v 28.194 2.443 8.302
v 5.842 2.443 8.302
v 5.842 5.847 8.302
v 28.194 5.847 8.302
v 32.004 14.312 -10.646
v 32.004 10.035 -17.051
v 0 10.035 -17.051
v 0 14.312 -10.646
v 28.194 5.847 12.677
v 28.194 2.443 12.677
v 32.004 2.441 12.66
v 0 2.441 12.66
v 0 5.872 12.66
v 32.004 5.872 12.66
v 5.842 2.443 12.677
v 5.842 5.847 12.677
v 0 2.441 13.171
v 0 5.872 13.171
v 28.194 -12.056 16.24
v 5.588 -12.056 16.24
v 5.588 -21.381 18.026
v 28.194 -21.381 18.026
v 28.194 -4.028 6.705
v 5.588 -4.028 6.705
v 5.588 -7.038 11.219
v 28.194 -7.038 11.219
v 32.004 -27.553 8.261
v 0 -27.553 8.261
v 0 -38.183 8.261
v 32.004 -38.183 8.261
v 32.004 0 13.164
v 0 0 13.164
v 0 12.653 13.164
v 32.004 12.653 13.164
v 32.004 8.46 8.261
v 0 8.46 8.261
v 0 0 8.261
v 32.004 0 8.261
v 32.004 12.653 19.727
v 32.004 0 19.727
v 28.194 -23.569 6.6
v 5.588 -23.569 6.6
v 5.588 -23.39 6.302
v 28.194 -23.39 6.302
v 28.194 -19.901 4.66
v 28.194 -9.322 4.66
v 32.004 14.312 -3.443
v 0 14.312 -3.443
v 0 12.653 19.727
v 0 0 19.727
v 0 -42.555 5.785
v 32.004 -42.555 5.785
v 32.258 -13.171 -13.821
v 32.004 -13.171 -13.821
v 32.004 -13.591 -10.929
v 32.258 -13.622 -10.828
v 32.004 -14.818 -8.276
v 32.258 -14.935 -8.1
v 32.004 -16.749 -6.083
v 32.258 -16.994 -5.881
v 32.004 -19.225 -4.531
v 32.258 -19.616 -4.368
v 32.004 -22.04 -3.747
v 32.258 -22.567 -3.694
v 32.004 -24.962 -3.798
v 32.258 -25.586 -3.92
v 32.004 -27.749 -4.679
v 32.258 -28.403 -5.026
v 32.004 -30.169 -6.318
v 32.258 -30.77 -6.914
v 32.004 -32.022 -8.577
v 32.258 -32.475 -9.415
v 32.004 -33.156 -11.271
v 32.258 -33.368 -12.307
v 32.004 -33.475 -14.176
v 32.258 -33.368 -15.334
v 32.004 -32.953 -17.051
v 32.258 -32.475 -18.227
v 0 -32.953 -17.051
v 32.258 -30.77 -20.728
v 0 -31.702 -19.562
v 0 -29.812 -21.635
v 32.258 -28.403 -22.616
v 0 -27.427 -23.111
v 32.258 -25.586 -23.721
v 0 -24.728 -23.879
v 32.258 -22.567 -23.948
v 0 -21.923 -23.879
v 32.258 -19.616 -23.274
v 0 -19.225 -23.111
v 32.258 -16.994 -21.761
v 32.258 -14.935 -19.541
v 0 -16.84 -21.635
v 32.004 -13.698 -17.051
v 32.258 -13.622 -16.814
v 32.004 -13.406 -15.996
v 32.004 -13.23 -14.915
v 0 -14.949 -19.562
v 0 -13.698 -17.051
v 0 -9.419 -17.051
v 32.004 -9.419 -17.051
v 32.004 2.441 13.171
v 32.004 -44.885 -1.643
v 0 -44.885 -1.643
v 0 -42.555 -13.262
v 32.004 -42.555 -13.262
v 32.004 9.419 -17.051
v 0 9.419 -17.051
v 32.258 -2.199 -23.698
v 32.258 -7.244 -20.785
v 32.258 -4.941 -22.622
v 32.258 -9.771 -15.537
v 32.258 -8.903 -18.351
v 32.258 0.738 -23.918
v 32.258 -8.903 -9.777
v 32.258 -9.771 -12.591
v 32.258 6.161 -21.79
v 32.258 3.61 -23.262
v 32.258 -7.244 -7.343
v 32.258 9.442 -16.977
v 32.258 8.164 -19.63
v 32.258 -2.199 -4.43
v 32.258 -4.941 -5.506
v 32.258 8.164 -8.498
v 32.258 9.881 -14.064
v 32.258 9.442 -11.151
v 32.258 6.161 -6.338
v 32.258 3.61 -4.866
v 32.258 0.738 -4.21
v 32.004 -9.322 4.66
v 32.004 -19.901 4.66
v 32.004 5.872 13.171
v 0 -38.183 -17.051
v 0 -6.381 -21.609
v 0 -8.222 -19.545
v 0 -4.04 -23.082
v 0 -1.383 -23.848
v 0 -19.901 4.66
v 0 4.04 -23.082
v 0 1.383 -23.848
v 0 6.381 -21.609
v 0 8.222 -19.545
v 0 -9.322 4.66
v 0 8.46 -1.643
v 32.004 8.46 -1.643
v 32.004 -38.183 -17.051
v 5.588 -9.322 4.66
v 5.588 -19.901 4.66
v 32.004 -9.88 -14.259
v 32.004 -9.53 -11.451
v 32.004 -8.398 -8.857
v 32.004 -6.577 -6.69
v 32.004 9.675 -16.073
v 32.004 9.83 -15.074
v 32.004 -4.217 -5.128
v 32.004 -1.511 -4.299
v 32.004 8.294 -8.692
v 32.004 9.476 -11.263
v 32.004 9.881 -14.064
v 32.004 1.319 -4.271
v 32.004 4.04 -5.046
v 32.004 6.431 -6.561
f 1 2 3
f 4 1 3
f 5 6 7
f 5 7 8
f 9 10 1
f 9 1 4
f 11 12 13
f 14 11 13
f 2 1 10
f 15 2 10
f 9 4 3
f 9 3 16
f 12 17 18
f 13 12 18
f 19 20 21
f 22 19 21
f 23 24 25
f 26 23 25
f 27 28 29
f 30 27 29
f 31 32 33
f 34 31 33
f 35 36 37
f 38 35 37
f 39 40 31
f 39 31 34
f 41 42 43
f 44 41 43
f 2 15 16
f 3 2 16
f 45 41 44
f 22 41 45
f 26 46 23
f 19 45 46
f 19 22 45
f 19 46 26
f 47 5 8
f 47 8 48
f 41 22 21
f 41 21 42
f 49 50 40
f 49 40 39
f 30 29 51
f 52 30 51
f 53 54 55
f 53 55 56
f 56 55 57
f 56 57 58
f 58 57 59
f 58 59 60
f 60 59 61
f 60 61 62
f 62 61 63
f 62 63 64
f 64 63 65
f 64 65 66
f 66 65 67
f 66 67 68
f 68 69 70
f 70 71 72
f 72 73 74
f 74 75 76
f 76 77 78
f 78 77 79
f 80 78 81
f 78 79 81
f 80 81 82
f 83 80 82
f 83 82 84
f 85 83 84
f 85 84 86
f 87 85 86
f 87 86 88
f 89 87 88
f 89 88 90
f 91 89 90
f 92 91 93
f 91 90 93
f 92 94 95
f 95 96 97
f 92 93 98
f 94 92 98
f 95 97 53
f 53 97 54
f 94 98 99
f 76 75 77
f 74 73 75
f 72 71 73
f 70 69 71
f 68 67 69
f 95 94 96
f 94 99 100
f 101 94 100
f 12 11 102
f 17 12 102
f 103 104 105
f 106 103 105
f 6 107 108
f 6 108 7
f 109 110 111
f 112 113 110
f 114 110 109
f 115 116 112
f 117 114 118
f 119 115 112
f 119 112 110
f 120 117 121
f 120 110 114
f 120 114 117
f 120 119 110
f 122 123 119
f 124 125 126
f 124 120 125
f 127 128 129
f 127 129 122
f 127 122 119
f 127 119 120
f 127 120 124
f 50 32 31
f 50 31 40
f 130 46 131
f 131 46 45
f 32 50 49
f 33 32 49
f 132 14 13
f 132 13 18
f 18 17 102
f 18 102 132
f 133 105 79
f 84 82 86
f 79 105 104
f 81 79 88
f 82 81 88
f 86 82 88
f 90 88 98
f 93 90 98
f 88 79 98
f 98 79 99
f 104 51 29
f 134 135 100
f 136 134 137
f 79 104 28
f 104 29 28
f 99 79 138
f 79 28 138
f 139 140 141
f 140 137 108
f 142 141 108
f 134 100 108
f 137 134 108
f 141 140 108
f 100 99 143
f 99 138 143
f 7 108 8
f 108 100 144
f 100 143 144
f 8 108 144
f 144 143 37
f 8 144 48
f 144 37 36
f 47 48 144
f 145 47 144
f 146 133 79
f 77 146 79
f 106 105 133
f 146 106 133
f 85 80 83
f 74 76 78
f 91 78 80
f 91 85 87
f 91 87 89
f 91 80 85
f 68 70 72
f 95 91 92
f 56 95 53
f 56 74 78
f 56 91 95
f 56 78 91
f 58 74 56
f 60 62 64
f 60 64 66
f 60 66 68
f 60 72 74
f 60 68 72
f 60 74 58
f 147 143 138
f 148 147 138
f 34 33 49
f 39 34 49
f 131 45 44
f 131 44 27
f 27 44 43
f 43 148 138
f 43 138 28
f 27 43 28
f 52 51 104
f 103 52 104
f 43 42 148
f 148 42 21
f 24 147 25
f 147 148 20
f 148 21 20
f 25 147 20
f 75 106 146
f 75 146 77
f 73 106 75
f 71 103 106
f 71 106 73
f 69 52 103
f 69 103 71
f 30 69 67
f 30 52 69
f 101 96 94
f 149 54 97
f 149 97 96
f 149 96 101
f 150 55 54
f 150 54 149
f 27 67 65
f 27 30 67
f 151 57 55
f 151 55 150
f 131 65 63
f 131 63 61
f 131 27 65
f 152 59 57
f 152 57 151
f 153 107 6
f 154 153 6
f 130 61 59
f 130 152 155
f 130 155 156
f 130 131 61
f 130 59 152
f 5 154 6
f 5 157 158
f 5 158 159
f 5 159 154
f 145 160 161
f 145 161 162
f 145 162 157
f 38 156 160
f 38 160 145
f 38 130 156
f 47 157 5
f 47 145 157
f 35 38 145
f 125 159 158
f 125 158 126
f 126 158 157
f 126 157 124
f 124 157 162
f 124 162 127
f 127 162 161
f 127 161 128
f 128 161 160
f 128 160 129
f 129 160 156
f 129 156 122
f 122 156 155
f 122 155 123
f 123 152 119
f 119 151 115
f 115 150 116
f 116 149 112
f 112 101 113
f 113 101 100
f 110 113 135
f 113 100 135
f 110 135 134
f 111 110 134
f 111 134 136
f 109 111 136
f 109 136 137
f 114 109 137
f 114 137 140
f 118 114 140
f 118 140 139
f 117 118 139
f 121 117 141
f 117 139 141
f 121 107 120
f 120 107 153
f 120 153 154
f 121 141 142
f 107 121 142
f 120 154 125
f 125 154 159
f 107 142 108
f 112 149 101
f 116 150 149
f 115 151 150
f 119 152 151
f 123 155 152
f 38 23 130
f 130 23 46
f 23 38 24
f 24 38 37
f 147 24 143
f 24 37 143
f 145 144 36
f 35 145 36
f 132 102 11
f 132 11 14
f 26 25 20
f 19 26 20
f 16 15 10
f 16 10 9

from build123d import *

# Parameters (mm, degrees)
F1_DEPTH  = 32.004
F3_START  = 5.588
F3_DEPTH  = 22.606
F5_START  = 5.842
F4_W      = 3.4034436103
F4_H      = 4.3758554384
F5_DEPTH  = 22.352
F6_W      = 12.653497979
F6_H      = 6.5637845546
F7_DEPTH  = 32.004
F8_R      = 10.1551964282
F8_R_2    = 9.881466812
F9_DEPTH  = 32.258
F10_W     = 3.4310170449
F10_H     = 0.5102269351
F11_DEPTH = 32.004


with BuildPart() as f1:
    # F0 (on Right) → F1 (new body)
    with BuildSketch(Plane.YZ):
        Polygon((-38.1832793355, -17.0513112098), (-30.604917556, -17.0513112098), (-27.5534950197, -17.0513112098), (-27.5534950197, -10.6459967792), (-23.5019996762, -7.4948342517), (-18.1000065058, -10.6459967792), (-18.1000065058, -17.0513112098), (-3.0503056051, -17.0513112098), (-3.0503056051, -9.3450688), (0, -5.919252988), (5.3086332045, -10.6459967792), (5.3086332045, -17.0513112098), (10.0353760645, -17.0513112098), (14.3119534478, -10.6459967792), (14.3119534478, -3.4433389083), (8.4597952664, -1.6426743241), (8.4597952664, 8.2609811798), (0, 8.2609811798), (-9.3217669055, 4.6596517786), (-19.9006702751, 4.6596517786), (-27.5534950197, 8.2609811798), (-38.1832793355, 8.2609811798), (-42.5554104149, 5.7850671001), (-44.8848903179, -1.6426743241), (-42.5554104149, -13.2621303201), align=None)
    extrude(amount=F1_DEPTH)

    # F2 (on Right) → F3 (join)
    with BuildSketch(Plane.YZ.offset(F3_START)):
        Polygon((-21.3809460402, 18.0256459862), (-23.568874225, 6.5997978672), (-21.3809460402, 2.9532494955), (-12.055656352, 2.9532494955), (-3.6344151013, 6.1135911383), (-7.0378584787, 11.2187573686), (-12.055656352, 16.2399523617), align=None)
    extrude(amount=F3_DEPTH)

    # F8 (on Right) → F9 (join)
    with BuildSketch(Plane.YZ):
        with Locations((-23.3257710934, -13.8208679855)):
            Circle(F8_R)
        with Locations((0, -14.0639711171)):
            Circle(F8_R_2)
    extrude(amount=F9_DEPTH)


with BuildPart() as f5:
    # F4 (on Right) → F5 (new body)
    with BuildSketch(Plane.YZ.offset(F5_START)):
        with Locations((4.144886625, 10.4894484393)):
            Rectangle(F4_W, F4_H)
    extrude(amount=F5_DEPTH)


with BuildPart() as f7:
    # F6 (on Right) → F7 (new body)
    with BuildSketch(Plane.YZ):
        with Locations((6.3267489895, 16.4454737678)):
            Rectangle(F6_W, F6_H)
    extrude(amount=F7_DEPTH)


with BuildPart() as f11:
    # F10 (on Right) → F11 (new body)
    with BuildSketch(Plane.YZ):
        with Locations((4.1560337413, 12.9155237228)):
            Rectangle(F10_W, F10_H)
    extrude(amount=F11_DEPTH)


solid = Compound([f1.part, f5.part, f7.part, f11.part])
